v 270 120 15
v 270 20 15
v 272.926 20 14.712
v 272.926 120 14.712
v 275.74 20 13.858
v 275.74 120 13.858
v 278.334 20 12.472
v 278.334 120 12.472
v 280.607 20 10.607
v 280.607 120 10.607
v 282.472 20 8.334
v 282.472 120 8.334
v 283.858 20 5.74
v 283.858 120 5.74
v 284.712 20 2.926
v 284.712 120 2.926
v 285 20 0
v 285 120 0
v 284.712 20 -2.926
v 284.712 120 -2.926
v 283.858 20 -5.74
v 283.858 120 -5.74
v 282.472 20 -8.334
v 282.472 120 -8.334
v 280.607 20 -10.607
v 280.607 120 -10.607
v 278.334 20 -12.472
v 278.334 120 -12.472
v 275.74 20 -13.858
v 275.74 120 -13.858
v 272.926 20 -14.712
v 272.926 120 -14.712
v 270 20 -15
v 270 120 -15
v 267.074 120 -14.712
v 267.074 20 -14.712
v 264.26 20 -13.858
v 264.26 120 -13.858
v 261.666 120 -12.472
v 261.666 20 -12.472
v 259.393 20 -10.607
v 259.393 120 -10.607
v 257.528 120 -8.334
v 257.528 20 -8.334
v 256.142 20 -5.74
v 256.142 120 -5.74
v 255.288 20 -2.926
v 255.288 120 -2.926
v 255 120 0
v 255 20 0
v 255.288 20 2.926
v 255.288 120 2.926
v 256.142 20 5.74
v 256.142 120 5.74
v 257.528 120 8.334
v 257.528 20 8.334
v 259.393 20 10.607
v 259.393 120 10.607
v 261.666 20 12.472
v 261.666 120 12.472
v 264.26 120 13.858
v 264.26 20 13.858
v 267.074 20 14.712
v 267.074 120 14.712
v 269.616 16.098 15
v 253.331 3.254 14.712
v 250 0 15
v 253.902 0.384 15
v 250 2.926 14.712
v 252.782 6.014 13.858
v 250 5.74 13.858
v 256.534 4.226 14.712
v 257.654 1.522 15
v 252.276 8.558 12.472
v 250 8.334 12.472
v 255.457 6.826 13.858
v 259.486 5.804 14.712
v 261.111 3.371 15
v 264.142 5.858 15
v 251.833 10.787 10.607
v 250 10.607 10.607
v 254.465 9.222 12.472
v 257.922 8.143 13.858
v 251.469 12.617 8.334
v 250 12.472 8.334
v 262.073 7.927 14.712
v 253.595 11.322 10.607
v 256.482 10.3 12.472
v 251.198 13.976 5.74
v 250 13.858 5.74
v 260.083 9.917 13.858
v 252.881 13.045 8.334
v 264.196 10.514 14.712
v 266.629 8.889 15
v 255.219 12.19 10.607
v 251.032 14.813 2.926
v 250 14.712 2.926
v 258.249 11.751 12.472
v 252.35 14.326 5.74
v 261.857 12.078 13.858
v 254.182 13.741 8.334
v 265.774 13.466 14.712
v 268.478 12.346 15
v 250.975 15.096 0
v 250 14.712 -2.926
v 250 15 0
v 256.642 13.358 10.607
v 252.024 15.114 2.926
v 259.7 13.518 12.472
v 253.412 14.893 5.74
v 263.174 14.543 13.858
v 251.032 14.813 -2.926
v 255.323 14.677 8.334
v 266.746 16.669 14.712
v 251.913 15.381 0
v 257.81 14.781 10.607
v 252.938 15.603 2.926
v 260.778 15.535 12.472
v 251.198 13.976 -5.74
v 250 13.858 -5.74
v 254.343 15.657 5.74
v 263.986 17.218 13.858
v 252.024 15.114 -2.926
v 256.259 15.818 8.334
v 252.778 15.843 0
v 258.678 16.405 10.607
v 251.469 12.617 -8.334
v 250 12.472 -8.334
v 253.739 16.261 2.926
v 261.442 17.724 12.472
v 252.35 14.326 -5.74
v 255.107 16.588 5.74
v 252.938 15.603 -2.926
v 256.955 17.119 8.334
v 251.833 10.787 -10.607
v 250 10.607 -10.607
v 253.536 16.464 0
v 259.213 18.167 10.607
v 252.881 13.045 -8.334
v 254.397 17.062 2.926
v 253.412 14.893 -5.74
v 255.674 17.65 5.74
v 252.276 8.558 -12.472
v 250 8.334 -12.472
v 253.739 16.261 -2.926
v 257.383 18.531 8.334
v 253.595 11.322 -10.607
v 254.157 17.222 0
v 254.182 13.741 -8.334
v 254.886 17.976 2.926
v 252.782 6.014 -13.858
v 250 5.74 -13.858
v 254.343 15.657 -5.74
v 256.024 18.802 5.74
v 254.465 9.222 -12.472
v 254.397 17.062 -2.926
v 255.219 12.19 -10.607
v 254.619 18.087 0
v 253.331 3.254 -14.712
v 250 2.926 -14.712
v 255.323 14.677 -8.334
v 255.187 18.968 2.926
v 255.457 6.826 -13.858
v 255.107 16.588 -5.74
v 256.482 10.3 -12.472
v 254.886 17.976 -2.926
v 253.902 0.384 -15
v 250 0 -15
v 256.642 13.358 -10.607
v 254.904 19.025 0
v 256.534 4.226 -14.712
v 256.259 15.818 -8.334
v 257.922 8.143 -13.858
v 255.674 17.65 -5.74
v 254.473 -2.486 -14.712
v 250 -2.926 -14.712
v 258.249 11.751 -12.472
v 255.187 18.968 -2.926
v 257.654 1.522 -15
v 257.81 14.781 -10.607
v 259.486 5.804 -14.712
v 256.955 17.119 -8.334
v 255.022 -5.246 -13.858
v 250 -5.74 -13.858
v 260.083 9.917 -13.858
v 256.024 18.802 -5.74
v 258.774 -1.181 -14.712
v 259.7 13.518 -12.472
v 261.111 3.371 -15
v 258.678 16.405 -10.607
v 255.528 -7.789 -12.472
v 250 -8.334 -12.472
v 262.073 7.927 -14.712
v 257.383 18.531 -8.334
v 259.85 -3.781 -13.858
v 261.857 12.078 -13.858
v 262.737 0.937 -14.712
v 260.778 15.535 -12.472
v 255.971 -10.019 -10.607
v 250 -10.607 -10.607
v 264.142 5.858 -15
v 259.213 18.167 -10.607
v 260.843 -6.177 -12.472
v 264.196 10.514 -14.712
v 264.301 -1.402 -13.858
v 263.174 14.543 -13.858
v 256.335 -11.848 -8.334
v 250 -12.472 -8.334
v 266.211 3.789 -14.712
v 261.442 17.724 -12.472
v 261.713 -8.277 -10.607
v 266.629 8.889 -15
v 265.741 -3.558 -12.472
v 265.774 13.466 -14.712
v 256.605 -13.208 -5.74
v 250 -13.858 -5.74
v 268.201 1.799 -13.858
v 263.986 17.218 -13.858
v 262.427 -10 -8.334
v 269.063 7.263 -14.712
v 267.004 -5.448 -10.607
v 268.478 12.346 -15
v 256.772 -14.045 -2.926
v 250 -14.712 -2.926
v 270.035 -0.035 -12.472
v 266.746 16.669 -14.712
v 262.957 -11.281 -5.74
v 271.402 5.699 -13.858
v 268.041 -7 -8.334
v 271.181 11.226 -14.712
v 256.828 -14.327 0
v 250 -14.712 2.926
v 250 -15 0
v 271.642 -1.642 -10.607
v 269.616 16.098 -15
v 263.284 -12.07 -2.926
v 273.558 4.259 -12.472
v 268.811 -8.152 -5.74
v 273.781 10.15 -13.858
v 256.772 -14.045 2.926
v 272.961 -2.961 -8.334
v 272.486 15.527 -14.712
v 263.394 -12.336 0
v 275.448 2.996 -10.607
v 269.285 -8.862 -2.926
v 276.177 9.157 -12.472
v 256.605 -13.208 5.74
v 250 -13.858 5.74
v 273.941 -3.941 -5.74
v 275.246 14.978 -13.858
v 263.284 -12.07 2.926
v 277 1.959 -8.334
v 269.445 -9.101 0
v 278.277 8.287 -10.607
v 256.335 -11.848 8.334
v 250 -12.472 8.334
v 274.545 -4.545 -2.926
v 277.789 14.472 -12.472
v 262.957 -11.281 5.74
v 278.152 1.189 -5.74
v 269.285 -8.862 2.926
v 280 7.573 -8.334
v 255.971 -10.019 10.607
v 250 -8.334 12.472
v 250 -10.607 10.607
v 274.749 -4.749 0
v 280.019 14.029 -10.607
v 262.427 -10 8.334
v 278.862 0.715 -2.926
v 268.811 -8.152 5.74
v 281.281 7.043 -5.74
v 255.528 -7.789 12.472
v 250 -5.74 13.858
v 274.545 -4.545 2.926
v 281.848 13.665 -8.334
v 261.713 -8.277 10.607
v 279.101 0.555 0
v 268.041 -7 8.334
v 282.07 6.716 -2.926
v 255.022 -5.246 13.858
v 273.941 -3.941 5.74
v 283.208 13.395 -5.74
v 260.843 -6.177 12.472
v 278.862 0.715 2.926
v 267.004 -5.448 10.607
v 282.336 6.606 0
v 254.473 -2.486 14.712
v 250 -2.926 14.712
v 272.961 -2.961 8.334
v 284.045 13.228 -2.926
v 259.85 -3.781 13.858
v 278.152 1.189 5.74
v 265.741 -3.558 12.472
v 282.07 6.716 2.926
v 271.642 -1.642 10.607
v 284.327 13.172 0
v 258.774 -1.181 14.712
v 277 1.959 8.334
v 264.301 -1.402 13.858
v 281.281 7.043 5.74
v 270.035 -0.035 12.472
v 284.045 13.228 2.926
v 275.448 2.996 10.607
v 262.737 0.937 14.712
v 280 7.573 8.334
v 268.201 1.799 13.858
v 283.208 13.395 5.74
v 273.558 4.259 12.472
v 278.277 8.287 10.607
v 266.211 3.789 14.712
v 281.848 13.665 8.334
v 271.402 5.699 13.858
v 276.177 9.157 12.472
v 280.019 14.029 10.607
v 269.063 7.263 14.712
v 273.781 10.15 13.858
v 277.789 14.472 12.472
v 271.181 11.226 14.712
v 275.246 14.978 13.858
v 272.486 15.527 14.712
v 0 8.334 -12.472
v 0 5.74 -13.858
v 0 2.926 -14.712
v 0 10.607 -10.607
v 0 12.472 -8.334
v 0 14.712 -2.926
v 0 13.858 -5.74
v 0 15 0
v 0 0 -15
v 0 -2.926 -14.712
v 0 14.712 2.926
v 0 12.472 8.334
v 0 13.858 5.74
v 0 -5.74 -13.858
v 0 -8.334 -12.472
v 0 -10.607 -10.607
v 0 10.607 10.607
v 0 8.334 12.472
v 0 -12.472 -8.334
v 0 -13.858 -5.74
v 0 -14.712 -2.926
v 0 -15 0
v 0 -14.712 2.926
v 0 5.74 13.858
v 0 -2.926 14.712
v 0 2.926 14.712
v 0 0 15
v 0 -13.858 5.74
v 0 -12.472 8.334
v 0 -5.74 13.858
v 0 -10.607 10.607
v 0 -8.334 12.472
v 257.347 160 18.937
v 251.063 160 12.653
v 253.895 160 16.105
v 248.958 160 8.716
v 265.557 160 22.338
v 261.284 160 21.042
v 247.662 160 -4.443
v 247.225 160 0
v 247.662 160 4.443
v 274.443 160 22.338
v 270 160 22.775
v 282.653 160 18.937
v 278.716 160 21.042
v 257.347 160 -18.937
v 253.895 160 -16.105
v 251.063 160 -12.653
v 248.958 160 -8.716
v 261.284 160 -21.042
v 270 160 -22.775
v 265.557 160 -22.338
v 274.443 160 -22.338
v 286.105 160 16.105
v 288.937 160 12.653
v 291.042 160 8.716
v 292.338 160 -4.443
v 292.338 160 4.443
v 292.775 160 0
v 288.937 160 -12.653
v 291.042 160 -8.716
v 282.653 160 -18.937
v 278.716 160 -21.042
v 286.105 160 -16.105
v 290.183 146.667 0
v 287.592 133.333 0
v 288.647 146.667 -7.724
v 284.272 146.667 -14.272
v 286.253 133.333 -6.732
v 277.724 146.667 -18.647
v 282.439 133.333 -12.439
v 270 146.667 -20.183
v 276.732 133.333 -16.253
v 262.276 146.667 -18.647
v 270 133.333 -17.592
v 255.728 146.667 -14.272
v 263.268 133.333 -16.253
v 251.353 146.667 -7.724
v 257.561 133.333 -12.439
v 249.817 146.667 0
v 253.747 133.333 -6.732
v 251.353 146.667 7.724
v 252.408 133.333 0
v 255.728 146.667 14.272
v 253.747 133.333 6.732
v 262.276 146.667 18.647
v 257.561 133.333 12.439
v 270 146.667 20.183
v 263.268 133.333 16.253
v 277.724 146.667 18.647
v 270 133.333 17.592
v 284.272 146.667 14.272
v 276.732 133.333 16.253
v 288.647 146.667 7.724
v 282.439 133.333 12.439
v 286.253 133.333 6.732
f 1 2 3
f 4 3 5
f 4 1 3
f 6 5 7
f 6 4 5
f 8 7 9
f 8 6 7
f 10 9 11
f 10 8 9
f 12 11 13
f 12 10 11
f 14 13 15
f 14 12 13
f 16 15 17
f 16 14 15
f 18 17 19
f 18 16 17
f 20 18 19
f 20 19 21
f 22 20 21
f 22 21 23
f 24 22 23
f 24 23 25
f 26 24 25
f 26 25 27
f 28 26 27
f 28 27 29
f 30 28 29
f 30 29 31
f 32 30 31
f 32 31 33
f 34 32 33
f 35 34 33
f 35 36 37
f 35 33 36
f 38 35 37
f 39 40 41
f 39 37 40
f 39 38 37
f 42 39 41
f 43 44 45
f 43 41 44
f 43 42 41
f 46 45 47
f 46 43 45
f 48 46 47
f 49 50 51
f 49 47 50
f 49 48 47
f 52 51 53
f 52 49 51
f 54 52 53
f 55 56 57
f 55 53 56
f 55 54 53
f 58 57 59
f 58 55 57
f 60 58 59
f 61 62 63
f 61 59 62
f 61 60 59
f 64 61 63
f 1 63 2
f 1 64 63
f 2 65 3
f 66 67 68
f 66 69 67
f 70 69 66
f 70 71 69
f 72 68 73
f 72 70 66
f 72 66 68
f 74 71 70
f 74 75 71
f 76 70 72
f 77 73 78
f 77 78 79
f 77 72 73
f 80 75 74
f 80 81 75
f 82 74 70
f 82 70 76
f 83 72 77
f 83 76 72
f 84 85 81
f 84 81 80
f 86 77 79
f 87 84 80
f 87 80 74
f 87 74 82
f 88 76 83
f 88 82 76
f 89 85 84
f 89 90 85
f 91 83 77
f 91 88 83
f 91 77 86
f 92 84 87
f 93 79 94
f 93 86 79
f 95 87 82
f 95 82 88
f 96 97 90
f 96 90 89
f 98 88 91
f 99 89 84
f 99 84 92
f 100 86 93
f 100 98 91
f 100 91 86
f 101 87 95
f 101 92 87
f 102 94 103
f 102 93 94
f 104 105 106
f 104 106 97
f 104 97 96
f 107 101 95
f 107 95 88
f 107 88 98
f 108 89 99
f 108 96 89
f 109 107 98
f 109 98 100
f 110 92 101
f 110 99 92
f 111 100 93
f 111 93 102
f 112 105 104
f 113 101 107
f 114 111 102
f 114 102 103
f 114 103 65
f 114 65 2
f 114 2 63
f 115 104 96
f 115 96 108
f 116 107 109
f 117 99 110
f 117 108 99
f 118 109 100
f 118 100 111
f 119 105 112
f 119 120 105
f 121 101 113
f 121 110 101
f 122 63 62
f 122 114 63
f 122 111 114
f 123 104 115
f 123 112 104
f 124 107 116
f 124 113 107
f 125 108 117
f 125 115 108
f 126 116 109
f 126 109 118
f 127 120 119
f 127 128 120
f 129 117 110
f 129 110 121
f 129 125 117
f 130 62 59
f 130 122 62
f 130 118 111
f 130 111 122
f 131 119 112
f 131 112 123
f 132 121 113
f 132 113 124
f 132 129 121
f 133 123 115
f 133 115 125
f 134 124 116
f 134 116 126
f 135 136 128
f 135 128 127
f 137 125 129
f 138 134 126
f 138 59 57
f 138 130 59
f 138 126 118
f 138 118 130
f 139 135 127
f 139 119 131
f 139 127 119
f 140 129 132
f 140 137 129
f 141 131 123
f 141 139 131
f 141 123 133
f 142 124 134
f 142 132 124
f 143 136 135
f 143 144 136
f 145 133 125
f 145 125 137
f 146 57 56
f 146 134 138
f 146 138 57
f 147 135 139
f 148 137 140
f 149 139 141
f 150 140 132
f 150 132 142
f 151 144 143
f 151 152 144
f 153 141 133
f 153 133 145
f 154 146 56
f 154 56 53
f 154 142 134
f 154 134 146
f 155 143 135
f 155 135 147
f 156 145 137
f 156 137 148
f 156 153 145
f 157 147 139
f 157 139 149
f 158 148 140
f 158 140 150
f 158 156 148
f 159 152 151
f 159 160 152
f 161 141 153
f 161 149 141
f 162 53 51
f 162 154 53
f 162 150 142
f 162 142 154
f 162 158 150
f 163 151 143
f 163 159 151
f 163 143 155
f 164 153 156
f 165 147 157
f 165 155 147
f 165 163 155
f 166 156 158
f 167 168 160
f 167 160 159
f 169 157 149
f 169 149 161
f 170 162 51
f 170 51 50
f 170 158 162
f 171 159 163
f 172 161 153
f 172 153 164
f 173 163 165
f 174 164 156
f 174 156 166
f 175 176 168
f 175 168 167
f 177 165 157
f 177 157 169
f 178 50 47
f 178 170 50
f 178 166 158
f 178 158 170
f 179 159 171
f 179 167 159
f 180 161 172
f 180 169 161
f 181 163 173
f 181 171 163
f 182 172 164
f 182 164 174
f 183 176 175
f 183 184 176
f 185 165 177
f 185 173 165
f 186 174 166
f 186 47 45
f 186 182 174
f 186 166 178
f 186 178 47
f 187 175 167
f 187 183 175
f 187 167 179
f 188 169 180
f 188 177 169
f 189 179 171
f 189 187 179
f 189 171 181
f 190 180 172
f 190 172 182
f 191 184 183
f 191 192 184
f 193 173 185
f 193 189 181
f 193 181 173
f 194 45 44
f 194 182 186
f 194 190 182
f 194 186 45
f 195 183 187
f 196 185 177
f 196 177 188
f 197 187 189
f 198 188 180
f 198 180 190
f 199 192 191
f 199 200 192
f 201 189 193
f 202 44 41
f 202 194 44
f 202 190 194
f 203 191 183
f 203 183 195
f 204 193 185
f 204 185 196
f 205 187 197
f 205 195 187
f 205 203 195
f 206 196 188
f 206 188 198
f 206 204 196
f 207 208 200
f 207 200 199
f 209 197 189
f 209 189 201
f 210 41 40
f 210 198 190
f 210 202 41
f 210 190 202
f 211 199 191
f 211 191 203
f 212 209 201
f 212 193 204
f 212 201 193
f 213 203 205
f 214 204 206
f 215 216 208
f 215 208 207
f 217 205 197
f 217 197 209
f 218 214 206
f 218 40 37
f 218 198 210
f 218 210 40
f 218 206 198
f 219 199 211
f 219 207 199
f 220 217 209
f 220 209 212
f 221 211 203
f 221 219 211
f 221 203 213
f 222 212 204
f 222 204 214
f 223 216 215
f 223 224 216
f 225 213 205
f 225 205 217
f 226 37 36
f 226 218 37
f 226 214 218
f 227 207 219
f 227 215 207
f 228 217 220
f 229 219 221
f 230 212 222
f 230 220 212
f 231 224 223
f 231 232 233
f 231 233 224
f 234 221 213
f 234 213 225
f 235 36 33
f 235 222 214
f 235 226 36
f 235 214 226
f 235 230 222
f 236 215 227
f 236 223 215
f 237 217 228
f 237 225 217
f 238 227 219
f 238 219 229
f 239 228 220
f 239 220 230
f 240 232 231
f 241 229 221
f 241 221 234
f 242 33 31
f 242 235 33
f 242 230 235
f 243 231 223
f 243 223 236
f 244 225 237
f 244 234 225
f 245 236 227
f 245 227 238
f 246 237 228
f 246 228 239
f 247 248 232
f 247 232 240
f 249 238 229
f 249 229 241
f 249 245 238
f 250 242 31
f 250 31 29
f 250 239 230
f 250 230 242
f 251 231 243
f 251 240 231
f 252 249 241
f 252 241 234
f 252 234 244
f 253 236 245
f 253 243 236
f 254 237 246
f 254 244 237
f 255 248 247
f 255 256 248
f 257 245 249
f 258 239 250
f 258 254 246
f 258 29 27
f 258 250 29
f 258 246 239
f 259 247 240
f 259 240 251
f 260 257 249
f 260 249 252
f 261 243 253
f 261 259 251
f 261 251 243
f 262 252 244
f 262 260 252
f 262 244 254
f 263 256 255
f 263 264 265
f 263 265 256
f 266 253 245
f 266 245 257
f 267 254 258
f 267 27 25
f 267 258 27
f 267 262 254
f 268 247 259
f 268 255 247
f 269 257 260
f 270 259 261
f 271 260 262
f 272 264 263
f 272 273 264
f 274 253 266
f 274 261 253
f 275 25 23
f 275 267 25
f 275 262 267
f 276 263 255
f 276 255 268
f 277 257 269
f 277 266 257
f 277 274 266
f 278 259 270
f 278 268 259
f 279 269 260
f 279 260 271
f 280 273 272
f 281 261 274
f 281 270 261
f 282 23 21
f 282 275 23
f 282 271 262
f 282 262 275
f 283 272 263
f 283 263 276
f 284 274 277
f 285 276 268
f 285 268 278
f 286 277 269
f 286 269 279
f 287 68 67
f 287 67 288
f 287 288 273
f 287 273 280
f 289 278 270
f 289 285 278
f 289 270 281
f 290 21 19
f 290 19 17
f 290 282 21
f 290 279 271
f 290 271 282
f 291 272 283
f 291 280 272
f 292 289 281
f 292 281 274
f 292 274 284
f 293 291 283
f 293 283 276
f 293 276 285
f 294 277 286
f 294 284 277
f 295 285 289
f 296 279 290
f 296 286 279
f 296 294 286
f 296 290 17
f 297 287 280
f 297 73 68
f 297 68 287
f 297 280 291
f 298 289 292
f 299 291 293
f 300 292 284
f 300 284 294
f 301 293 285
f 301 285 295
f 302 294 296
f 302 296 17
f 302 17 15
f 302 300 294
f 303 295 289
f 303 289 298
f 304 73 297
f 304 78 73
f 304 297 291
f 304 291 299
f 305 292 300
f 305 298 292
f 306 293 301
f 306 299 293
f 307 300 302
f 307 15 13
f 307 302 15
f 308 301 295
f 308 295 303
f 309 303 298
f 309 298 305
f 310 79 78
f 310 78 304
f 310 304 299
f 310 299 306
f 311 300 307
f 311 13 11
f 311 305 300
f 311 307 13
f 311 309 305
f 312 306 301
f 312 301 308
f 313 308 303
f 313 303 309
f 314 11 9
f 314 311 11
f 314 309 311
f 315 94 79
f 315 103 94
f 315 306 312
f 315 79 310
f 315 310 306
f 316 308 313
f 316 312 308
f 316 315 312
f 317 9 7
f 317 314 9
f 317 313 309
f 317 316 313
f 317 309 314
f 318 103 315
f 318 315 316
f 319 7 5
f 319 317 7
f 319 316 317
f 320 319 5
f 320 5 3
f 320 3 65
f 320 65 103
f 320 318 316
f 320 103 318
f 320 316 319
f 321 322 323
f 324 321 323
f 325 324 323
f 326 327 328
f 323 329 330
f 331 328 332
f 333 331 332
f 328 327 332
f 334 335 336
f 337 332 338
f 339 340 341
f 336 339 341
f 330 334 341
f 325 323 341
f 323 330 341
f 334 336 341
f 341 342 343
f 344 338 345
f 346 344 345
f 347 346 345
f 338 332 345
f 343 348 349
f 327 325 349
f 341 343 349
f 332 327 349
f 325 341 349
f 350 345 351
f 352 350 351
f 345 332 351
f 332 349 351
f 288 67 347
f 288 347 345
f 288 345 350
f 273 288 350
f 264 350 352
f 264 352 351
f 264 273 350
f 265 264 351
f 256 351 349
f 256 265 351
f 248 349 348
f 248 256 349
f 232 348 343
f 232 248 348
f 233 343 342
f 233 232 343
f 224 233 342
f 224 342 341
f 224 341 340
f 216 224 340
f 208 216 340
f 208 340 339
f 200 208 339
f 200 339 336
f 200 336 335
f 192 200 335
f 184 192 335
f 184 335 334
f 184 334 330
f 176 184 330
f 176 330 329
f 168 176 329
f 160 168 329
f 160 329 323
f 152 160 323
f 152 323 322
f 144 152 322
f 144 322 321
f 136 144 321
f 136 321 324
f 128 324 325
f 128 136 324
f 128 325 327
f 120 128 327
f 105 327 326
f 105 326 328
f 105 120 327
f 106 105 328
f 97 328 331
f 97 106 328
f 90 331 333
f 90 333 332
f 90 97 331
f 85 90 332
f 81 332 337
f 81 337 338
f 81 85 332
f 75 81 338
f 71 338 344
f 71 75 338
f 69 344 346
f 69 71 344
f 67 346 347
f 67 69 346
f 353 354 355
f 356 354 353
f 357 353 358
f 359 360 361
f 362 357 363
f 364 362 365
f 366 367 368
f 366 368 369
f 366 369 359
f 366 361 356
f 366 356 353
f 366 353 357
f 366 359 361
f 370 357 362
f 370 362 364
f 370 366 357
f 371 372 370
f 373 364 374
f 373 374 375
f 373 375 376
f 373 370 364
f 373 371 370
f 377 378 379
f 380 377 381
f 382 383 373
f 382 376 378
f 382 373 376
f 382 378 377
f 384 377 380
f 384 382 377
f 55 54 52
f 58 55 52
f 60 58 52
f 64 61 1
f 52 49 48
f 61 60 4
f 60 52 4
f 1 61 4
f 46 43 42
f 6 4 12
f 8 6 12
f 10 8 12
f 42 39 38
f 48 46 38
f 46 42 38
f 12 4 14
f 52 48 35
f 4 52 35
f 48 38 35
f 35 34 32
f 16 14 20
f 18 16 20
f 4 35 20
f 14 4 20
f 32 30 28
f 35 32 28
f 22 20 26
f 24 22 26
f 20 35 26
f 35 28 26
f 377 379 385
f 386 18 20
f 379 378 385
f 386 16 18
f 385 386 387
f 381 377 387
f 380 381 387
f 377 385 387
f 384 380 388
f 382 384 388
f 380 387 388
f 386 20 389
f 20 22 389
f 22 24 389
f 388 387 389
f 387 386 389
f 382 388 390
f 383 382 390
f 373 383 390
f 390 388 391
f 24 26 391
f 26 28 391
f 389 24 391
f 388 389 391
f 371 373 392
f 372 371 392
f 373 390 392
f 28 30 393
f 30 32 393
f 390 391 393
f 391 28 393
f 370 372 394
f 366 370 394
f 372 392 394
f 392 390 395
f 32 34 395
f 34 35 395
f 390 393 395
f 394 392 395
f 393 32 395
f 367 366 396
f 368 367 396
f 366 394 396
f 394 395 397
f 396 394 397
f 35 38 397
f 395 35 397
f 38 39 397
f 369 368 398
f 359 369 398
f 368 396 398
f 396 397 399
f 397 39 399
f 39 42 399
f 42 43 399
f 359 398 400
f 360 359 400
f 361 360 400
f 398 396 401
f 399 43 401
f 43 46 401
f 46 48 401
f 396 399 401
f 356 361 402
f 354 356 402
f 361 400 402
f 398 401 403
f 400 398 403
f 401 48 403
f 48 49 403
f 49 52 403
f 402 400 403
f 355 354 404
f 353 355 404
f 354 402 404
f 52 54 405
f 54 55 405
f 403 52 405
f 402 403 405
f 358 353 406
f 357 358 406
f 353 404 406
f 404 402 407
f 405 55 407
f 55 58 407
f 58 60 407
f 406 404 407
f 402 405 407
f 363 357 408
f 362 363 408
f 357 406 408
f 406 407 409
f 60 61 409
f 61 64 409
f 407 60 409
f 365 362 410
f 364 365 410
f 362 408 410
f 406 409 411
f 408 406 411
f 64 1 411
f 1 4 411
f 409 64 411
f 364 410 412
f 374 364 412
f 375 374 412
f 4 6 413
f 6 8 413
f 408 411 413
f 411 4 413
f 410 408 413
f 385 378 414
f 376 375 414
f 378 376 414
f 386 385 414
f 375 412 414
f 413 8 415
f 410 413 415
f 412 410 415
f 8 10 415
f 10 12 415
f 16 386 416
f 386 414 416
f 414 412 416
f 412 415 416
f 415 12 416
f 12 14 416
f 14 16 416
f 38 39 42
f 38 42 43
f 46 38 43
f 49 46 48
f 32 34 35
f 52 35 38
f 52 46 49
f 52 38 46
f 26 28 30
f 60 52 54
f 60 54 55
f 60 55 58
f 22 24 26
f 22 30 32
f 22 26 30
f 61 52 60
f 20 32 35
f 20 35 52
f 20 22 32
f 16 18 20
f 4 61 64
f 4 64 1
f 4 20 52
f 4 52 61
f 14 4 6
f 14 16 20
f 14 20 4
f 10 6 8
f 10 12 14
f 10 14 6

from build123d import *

# Parameters (mm, degrees)
SWEEP1_PROFILE_R    = 15
SKETCH30_R          = 15
BOSS_EXTRUDE1_DEPTH = 40
BOSS_EXTRUDE1_DRAFT = -11


with BuildPart() as part:
    # Sweep1: sweep along a path in Sketch1
    with BuildLine(Plane.XY) as sweep1_path:
        Line((0, 0), (250, 0))
        ThreePointArc((250, 0), (264.142135624, 5.857864376), (270, 20))
        Line((270, 20), (270, 120))
    # Sweep1 profile (on start of the path) → Sweep1 (sweep)
    with BuildSketch(Plane(origin=(0, 0, 0), x_dir=(0, 0, 1), z_dir=(1, 0, 0))):
        Circle(SWEEP1_PROFILE_R)
    sweep(path=sweep1_path.line)


with BuildPart() as body_2:
    # Sketch30 → Boss-Extrude1 (with draft: the straight prism first)
    with BuildSketch(Plane(origin=(0, 120, 0), x_dir=(1, 0, 0), z_dir=(0, 1, 0))):
        with Locations((270, 0)):
            Circle(SKETCH30_R)
    extrude(amount=BOSS_EXTRUDE1_DEPTH)
    # Boss-Extrude1: the draft: its side faces are tilted about the plane it starts from
    boss_extrude1_sides = [body_2.faces().sort_by_distance(p)[0] for p in [
        (255, 140, 0),
    ]]
    draft(boss_extrude1_sides, Plane(origin=(0, 120, 0), x_dir=(1, 0, 0), z_dir=(0, 1, 0)), BOSS_EXTRUDE1_DRAFT)


solid = Compound([part.part, body_2.part])
